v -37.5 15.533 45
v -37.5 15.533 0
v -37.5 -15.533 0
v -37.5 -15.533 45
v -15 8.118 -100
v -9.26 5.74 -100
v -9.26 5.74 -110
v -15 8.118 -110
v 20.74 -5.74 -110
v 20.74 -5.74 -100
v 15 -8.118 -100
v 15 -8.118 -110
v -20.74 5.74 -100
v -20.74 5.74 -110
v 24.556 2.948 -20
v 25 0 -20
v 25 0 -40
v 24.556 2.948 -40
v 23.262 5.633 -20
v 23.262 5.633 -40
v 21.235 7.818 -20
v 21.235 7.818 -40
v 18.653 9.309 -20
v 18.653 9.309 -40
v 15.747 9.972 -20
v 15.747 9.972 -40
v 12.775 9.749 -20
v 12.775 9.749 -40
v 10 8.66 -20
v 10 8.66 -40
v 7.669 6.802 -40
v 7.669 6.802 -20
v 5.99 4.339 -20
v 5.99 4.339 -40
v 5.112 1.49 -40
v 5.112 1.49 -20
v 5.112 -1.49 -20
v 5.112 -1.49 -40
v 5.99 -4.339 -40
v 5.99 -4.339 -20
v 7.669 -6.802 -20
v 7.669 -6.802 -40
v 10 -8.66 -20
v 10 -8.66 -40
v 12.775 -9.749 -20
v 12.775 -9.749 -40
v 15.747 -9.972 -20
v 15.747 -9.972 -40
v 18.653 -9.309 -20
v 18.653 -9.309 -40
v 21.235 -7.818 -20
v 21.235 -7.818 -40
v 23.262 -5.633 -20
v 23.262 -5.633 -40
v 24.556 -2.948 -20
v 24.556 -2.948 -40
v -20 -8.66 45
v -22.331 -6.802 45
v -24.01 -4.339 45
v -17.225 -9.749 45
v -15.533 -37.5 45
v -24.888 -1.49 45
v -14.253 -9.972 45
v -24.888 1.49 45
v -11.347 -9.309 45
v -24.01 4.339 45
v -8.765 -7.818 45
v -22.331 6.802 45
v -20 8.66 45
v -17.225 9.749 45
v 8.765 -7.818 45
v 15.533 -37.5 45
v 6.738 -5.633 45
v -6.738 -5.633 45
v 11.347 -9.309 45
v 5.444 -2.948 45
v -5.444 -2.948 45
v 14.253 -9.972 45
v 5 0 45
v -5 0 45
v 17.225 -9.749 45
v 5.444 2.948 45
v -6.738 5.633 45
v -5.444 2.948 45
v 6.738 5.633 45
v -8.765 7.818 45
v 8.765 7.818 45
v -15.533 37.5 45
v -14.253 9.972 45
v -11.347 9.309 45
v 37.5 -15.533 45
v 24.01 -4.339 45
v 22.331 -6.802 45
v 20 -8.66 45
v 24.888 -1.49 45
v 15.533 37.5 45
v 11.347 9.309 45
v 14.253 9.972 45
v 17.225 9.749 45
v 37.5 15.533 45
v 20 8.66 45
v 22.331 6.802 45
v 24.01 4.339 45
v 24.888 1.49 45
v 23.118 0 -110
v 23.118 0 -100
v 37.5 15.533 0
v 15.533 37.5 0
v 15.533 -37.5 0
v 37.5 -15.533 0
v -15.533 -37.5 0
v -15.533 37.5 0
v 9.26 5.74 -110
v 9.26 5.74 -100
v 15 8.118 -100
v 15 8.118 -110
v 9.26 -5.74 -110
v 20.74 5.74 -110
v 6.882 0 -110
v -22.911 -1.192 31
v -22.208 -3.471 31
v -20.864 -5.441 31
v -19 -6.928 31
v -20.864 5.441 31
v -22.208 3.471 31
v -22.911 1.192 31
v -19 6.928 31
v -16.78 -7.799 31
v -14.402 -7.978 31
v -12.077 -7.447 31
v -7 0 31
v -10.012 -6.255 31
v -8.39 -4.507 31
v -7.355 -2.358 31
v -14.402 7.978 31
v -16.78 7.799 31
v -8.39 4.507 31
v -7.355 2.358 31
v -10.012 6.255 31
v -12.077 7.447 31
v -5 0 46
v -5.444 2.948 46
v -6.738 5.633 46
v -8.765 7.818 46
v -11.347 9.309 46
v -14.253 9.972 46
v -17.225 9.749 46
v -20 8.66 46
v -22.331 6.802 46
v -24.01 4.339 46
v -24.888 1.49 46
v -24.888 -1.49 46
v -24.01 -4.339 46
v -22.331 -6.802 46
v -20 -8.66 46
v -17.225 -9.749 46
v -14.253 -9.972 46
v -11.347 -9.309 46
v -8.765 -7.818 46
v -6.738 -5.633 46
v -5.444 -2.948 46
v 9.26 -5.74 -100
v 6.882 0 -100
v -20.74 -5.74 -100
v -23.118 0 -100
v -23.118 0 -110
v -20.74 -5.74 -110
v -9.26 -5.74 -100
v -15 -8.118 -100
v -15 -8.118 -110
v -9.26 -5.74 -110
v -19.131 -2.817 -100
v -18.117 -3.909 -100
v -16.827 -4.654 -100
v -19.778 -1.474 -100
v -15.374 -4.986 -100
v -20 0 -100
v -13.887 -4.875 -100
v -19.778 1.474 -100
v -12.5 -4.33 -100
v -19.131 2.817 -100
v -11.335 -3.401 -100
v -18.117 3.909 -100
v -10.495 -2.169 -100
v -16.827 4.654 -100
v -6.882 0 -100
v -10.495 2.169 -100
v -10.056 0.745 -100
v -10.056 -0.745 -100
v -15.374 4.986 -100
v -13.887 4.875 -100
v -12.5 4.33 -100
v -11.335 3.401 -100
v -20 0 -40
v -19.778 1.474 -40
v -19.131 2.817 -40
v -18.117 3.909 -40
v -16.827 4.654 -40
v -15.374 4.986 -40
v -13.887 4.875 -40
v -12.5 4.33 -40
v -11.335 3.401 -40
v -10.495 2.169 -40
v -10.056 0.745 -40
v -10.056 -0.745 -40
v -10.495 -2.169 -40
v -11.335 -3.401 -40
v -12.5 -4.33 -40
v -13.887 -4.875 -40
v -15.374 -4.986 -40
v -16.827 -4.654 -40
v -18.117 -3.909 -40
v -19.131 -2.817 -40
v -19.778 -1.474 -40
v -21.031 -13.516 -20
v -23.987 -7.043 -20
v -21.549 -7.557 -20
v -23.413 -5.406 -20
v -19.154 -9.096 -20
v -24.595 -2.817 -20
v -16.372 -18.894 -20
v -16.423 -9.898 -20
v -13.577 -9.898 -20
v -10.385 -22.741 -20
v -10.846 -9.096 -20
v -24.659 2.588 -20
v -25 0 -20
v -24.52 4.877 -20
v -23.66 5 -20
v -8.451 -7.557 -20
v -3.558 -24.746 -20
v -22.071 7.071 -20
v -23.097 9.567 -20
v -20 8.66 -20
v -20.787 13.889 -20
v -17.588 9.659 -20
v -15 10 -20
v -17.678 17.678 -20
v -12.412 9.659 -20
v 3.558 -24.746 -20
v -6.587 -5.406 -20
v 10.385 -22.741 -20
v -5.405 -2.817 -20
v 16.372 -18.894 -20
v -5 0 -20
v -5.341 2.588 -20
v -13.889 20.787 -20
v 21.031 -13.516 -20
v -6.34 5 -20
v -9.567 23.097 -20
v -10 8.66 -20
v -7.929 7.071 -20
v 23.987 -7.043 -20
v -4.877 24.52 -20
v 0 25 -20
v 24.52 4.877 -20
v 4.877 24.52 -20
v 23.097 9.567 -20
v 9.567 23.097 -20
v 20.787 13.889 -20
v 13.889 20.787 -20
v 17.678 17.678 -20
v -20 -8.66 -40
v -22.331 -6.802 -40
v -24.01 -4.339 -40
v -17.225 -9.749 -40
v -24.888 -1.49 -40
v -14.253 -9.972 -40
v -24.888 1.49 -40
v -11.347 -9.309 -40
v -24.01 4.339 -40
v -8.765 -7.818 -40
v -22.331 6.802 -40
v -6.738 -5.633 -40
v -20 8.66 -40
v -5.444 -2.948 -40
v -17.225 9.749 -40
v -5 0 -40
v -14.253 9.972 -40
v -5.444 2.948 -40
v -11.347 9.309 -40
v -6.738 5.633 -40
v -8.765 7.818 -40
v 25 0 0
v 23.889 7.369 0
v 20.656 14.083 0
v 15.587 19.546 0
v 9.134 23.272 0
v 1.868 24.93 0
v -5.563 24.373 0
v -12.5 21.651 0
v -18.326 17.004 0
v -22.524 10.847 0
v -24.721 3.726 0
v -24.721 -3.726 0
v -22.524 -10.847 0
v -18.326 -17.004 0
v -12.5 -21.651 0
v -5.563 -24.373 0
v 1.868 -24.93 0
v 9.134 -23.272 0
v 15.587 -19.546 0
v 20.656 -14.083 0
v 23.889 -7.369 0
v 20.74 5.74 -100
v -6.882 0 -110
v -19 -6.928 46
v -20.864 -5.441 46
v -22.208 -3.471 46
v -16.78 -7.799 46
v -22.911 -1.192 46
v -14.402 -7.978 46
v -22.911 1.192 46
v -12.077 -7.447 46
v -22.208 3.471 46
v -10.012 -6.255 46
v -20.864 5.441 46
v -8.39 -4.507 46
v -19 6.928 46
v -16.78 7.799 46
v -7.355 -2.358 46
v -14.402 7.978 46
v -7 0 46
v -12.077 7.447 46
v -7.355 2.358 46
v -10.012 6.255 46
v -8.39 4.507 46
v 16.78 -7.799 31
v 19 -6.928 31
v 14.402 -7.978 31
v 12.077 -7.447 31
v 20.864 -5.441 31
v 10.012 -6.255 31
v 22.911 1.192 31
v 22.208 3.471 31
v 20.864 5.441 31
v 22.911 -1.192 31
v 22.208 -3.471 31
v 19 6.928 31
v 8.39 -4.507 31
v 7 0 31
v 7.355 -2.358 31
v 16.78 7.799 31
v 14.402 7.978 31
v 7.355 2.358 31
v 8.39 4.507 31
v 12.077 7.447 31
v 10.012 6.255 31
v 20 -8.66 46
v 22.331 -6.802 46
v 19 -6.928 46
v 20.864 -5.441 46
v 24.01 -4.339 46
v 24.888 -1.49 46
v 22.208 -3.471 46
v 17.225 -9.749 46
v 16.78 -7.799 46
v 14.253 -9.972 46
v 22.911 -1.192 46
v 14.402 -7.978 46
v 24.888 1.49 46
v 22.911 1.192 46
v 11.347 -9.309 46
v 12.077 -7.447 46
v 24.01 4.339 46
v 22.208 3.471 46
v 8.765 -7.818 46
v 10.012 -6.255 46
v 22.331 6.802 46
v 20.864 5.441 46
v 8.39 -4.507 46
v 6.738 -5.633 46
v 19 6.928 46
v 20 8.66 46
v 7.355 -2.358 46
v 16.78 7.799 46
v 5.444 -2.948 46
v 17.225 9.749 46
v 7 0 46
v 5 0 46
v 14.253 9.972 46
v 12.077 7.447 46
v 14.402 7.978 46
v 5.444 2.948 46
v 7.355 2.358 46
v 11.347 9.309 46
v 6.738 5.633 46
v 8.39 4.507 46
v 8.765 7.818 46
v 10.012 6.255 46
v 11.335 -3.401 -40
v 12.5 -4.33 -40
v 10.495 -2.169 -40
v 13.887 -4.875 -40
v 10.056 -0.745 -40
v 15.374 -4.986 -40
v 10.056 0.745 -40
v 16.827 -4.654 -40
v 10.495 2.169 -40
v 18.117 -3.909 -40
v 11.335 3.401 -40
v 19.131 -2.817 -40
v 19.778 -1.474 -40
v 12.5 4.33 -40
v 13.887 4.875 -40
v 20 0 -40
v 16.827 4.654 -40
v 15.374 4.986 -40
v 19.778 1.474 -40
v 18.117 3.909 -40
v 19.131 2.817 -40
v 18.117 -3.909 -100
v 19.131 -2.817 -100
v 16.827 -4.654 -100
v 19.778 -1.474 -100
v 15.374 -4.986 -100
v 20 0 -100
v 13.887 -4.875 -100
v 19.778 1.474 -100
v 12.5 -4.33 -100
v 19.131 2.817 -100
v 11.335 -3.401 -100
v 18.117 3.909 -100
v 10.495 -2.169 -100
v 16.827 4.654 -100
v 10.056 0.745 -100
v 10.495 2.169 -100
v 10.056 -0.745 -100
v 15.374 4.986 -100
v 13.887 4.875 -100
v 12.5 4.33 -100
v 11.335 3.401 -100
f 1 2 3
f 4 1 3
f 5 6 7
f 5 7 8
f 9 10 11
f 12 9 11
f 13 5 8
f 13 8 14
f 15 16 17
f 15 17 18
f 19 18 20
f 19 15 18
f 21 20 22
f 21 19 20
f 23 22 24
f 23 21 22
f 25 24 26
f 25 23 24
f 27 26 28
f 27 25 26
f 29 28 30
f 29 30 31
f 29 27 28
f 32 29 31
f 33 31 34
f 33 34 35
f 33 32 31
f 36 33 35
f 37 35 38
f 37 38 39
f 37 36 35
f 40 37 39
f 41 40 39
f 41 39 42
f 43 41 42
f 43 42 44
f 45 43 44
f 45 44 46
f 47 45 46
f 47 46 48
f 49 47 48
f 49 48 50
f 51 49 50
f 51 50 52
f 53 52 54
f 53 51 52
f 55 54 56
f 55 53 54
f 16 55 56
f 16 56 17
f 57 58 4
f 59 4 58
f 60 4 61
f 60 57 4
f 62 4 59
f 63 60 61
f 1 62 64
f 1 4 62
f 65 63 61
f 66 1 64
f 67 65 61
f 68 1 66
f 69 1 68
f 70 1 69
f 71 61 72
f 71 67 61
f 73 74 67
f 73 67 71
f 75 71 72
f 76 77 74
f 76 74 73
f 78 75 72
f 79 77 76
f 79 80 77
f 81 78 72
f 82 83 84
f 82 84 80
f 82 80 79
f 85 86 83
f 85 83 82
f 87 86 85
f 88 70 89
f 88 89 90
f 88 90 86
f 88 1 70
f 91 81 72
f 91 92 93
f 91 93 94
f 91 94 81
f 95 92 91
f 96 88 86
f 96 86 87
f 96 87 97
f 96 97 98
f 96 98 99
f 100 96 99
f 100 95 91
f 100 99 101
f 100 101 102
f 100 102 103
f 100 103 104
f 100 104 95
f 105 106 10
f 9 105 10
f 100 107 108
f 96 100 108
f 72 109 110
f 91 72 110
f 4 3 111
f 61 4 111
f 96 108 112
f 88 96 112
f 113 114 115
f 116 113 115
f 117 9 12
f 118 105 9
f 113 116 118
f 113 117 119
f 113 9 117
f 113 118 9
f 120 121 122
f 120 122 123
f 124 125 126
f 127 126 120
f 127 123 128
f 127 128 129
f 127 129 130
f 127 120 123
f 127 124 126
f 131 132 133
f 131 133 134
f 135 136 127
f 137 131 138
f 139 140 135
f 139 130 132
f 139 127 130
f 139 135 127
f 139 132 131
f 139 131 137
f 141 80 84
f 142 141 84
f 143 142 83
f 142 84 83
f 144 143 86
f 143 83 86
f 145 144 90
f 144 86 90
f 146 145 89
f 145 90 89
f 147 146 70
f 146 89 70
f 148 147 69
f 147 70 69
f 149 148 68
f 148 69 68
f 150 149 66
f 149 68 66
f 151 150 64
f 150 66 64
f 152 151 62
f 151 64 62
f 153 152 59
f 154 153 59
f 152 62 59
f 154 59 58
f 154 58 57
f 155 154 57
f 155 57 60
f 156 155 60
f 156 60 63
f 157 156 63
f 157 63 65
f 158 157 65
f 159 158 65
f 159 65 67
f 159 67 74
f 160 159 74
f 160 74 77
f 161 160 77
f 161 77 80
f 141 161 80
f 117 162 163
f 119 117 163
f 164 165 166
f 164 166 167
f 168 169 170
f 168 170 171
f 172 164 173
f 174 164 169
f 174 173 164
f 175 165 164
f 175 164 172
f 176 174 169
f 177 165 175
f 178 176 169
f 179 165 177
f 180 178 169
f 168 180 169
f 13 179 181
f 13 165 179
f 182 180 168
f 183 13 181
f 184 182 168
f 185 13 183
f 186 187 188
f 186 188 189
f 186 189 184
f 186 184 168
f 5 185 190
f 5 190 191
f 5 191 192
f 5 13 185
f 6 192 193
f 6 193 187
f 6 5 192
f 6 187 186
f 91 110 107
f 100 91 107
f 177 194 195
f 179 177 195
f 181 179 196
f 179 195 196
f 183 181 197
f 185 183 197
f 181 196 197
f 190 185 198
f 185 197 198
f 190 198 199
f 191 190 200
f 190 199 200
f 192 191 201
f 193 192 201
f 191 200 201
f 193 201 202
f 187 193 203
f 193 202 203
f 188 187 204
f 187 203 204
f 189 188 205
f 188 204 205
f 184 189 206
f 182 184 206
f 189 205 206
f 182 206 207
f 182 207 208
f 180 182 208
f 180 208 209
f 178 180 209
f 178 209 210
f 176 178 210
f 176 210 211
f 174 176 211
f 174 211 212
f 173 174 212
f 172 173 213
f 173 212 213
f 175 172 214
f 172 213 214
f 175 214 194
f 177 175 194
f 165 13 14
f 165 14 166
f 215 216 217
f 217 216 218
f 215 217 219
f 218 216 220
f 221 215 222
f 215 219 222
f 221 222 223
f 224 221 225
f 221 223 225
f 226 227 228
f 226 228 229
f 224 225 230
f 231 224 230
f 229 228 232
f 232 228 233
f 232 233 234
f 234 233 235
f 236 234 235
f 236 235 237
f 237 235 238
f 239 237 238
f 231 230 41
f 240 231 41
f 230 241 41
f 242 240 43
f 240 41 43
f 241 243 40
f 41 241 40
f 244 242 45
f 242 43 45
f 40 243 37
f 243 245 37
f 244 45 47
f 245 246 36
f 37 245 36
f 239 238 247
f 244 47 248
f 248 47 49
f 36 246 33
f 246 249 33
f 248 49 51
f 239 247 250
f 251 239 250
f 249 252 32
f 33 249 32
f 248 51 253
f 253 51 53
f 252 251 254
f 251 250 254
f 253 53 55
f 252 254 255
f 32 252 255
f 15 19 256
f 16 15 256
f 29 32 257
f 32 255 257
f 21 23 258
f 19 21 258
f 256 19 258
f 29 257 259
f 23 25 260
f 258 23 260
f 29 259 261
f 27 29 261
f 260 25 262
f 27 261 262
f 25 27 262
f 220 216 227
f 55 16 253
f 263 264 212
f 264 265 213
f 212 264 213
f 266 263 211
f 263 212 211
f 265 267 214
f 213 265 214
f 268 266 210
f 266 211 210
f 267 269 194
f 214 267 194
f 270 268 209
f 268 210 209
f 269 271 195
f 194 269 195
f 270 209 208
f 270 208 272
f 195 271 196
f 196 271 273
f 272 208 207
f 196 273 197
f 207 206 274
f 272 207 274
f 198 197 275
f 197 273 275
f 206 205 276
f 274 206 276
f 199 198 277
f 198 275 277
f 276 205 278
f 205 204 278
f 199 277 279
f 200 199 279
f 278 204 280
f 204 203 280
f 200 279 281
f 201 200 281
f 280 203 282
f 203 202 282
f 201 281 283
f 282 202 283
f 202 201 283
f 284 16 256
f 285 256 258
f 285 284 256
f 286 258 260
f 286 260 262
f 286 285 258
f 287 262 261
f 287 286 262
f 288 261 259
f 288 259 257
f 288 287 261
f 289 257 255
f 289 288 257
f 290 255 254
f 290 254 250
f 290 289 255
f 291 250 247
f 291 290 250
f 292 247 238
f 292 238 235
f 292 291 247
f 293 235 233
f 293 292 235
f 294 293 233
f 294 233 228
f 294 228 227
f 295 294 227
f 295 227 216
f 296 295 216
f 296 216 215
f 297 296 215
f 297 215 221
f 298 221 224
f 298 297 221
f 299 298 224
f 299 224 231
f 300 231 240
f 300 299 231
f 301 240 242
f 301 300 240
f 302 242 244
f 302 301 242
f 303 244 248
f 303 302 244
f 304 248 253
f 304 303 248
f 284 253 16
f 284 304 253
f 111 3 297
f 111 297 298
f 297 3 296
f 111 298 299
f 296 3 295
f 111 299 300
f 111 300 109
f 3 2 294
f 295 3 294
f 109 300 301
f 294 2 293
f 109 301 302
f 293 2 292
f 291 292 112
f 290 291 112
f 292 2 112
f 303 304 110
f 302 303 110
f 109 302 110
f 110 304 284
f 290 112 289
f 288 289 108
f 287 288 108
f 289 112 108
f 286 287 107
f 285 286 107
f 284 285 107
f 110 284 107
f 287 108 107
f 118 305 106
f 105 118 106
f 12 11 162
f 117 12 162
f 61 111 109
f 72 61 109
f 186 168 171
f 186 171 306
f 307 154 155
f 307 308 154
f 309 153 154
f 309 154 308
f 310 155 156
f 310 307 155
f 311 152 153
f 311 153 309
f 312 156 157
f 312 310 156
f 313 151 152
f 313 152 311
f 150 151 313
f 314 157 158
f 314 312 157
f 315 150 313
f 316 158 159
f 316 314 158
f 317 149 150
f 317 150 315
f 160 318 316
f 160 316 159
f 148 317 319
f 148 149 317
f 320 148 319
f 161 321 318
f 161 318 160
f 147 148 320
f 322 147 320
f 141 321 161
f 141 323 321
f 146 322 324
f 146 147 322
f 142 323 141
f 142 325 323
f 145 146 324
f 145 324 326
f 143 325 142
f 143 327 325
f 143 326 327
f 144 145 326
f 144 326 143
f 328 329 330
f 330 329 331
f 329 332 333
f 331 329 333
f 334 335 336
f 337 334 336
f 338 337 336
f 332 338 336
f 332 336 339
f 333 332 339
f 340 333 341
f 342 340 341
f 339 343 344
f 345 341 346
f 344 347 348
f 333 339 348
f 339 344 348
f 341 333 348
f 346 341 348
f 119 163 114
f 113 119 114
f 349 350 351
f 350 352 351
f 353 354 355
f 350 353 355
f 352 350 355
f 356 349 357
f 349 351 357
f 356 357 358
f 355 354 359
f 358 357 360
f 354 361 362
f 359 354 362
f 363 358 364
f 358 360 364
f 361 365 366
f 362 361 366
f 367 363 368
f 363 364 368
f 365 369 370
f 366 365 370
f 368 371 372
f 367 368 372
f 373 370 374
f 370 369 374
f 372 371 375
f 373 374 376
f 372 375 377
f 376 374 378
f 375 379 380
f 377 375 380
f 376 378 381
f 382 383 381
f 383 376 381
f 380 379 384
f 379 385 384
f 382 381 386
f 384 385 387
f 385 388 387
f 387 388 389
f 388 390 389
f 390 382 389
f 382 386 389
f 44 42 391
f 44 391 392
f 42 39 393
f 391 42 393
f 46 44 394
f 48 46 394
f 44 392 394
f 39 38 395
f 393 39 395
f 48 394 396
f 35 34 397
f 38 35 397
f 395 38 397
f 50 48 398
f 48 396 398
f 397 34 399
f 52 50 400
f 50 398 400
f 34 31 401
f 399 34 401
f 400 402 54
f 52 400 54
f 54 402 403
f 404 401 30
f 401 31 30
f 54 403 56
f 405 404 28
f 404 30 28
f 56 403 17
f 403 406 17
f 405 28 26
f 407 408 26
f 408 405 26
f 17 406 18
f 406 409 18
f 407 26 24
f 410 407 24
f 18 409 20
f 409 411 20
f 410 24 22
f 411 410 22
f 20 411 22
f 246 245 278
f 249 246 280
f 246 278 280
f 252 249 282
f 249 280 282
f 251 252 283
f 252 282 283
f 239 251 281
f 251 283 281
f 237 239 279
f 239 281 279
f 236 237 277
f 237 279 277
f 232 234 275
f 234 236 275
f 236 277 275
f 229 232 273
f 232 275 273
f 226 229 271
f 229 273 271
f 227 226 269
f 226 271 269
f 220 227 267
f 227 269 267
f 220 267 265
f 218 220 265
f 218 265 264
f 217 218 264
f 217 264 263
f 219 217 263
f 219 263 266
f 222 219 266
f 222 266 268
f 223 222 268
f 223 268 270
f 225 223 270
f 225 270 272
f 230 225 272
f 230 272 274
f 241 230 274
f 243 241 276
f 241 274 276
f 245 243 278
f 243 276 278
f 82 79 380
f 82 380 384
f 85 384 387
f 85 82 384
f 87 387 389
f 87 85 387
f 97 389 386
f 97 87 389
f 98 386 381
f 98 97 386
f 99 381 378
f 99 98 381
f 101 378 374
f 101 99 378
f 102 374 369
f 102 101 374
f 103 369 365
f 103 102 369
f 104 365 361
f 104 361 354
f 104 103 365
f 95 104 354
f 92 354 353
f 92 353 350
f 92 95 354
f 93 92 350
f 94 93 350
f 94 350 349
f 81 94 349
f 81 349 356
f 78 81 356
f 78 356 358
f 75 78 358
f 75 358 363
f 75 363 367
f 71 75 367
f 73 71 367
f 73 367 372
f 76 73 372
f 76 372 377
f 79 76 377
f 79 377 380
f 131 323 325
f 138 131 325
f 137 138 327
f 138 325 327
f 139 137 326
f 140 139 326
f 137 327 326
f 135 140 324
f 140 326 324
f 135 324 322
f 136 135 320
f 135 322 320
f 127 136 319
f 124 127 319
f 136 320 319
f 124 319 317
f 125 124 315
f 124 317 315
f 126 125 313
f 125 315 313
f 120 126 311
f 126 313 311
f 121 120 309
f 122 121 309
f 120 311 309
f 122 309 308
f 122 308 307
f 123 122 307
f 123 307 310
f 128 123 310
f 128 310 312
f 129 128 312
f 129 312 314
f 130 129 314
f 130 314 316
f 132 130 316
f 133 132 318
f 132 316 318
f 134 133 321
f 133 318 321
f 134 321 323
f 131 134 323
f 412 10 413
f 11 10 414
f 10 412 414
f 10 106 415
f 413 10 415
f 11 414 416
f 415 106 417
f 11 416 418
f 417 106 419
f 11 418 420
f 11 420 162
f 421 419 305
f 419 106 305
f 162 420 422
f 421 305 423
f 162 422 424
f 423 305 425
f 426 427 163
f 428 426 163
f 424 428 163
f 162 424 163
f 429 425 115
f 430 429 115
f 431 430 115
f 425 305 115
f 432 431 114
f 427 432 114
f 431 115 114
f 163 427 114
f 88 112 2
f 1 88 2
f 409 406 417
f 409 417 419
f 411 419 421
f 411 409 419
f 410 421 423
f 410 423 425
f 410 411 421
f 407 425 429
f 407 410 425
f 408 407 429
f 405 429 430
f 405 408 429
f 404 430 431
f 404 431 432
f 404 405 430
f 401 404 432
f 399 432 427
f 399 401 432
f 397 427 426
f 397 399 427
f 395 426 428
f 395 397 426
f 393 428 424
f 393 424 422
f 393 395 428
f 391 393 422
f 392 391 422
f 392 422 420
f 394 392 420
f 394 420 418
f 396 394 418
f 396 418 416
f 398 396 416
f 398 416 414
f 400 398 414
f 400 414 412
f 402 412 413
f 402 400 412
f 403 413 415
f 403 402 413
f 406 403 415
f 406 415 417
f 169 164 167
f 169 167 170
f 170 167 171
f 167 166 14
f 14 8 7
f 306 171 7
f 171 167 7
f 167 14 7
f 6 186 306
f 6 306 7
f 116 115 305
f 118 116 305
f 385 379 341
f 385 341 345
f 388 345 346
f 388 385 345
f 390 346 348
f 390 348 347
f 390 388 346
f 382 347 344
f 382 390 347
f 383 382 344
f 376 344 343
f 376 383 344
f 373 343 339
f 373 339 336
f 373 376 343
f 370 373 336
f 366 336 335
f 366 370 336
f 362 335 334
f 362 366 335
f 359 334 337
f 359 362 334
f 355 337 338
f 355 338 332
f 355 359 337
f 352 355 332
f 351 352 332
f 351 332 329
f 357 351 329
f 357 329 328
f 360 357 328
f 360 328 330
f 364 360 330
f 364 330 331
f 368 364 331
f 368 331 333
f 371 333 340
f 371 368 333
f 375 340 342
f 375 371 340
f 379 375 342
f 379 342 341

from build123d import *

# Parameters (mm, degrees)
BOSS_EXTRUDE1_DEPTH = 45
BOSS_EXTRUDE2_START = -40
SKETCH1_3_R         = 10
BOSS_EXTRUDE2_DEPTH = 86
SKETCH1_4_R         = 10
BOSS_EXTRUDE3_DEPTH = 40
SKETCH1_5_R         = 25
BOSS_EXTRUDE4_DEPTH = 20
SKETCH2_R           = 5
BOSS_EXTRUDE5_DEPTH = 60
BOSS_EXTRUDE6_DEPTH = 10
SKETCH4_R           = 8
CUT_EXTRUDE2_DEPTH  = 15


with BuildPart() as part:
    # Sketch1 → Boss-Extrude1 (new body)
    with BuildSketch(Plane.XY):
        Polygon((15.533008589, 37.5), (-15.533008589, 37.5), (-37.5, 15.533008589), (-37.5, -15.533008589), (-15.533008589, -37.5), (15.533008589, -37.5), (37.5, -15.533008589), (37.5, 15.533008589), align=None)
    extrude(amount=BOSS_EXTRUDE1_DEPTH)

    # Sketch1<3> → Boss-Extrude2 (add)
    with BuildSketch(Plane.XY.offset(BOSS_EXTRUDE2_START)):
        with Locations((-15, 0)):
            Circle(SKETCH1_3_R)
    boss_extrude2 = extrude(amount=BOSS_EXTRUDE2_DEPTH)

    # Sketch1<4> → Boss-Extrude3 (add)
    with BuildSketch(Plane.XY):
        with Locations((15, 0)):
            Circle(SKETCH1_4_R)
    extrude(amount=-BOSS_EXTRUDE3_DEPTH)

    # Sketch1<5> → Boss-Extrude4 (add)
    with BuildSketch(Plane.XY):
        Circle(SKETCH1_5_R)
    extrude(amount=-BOSS_EXTRUDE4_DEPTH)

    # Sketch2 → Boss-Extrude5 (add)
    with BuildSketch(Plane(origin=(0, 0, -40), x_dir=(-1, 0, 0), z_dir=(0, 0, -1))):
        with Locations((15, 0)):
            Circle(SKETCH2_R)
    boss_extrude5 = extrude(amount=BOSS_EXTRUDE5_DEPTH)

    # Mirror2: Boss-Extrude5 across plane
    add(boss_extrude5.mirror(Plane(origin=(0, 0, 0), x_dir=(0, 0, 1), z_dir=(1, 0, 0))))

    # Sketch3 → Boss-Extrude6 (add)
    with BuildSketch(Plane(origin=(0, 0, -100), x_dir=(-1, 0, 0), z_dir=(0, 0, -1))):
        Polygon((-6.882058498, 0), (-9.259748515, 5.740251485), (-15, 8.117941502), (-20.740251485, 5.740251485), (-23.117941502, 0), (-20.740251485, -5.740251485), (-15, -8.117941502), (-9.259748515, -5.740251485), align=None)
    boss_extrude6 = extrude(amount=BOSS_EXTRUDE6_DEPTH)

    # Mirror3: Boss-Extrude6 across plane
    add(boss_extrude6.mirror(Plane(origin=(0, 0, 0), x_dir=(0, 0, 1), z_dir=(1, 0, 0))))

    # Mirror4: Boss-Extrude2 across plane
    add(boss_extrude2.mirror(Plane(origin=(0, 0, 0), x_dir=(0, 0, 1), z_dir=(1, 0, 0))))

    # Sketch4 → Cut-Extrude2 (cut)
    with BuildSketch(Plane.XY.offset(46)):
        with Locations((-15, 0)):
            Circle(SKETCH4_R)
    cut_extrude2 = extrude(amount=-CUT_EXTRUDE2_DEPTH, mode=Mode.SUBTRACT)

    # Mirror5: Cut-Extrude2 across plane
    add(cut_extrude2.mirror(Plane(origin=(0, 0, 0), x_dir=(0, 0, 1), z_dir=(1, 0, 0))), mode=Mode.SUBTRACT)


solid = part.part
